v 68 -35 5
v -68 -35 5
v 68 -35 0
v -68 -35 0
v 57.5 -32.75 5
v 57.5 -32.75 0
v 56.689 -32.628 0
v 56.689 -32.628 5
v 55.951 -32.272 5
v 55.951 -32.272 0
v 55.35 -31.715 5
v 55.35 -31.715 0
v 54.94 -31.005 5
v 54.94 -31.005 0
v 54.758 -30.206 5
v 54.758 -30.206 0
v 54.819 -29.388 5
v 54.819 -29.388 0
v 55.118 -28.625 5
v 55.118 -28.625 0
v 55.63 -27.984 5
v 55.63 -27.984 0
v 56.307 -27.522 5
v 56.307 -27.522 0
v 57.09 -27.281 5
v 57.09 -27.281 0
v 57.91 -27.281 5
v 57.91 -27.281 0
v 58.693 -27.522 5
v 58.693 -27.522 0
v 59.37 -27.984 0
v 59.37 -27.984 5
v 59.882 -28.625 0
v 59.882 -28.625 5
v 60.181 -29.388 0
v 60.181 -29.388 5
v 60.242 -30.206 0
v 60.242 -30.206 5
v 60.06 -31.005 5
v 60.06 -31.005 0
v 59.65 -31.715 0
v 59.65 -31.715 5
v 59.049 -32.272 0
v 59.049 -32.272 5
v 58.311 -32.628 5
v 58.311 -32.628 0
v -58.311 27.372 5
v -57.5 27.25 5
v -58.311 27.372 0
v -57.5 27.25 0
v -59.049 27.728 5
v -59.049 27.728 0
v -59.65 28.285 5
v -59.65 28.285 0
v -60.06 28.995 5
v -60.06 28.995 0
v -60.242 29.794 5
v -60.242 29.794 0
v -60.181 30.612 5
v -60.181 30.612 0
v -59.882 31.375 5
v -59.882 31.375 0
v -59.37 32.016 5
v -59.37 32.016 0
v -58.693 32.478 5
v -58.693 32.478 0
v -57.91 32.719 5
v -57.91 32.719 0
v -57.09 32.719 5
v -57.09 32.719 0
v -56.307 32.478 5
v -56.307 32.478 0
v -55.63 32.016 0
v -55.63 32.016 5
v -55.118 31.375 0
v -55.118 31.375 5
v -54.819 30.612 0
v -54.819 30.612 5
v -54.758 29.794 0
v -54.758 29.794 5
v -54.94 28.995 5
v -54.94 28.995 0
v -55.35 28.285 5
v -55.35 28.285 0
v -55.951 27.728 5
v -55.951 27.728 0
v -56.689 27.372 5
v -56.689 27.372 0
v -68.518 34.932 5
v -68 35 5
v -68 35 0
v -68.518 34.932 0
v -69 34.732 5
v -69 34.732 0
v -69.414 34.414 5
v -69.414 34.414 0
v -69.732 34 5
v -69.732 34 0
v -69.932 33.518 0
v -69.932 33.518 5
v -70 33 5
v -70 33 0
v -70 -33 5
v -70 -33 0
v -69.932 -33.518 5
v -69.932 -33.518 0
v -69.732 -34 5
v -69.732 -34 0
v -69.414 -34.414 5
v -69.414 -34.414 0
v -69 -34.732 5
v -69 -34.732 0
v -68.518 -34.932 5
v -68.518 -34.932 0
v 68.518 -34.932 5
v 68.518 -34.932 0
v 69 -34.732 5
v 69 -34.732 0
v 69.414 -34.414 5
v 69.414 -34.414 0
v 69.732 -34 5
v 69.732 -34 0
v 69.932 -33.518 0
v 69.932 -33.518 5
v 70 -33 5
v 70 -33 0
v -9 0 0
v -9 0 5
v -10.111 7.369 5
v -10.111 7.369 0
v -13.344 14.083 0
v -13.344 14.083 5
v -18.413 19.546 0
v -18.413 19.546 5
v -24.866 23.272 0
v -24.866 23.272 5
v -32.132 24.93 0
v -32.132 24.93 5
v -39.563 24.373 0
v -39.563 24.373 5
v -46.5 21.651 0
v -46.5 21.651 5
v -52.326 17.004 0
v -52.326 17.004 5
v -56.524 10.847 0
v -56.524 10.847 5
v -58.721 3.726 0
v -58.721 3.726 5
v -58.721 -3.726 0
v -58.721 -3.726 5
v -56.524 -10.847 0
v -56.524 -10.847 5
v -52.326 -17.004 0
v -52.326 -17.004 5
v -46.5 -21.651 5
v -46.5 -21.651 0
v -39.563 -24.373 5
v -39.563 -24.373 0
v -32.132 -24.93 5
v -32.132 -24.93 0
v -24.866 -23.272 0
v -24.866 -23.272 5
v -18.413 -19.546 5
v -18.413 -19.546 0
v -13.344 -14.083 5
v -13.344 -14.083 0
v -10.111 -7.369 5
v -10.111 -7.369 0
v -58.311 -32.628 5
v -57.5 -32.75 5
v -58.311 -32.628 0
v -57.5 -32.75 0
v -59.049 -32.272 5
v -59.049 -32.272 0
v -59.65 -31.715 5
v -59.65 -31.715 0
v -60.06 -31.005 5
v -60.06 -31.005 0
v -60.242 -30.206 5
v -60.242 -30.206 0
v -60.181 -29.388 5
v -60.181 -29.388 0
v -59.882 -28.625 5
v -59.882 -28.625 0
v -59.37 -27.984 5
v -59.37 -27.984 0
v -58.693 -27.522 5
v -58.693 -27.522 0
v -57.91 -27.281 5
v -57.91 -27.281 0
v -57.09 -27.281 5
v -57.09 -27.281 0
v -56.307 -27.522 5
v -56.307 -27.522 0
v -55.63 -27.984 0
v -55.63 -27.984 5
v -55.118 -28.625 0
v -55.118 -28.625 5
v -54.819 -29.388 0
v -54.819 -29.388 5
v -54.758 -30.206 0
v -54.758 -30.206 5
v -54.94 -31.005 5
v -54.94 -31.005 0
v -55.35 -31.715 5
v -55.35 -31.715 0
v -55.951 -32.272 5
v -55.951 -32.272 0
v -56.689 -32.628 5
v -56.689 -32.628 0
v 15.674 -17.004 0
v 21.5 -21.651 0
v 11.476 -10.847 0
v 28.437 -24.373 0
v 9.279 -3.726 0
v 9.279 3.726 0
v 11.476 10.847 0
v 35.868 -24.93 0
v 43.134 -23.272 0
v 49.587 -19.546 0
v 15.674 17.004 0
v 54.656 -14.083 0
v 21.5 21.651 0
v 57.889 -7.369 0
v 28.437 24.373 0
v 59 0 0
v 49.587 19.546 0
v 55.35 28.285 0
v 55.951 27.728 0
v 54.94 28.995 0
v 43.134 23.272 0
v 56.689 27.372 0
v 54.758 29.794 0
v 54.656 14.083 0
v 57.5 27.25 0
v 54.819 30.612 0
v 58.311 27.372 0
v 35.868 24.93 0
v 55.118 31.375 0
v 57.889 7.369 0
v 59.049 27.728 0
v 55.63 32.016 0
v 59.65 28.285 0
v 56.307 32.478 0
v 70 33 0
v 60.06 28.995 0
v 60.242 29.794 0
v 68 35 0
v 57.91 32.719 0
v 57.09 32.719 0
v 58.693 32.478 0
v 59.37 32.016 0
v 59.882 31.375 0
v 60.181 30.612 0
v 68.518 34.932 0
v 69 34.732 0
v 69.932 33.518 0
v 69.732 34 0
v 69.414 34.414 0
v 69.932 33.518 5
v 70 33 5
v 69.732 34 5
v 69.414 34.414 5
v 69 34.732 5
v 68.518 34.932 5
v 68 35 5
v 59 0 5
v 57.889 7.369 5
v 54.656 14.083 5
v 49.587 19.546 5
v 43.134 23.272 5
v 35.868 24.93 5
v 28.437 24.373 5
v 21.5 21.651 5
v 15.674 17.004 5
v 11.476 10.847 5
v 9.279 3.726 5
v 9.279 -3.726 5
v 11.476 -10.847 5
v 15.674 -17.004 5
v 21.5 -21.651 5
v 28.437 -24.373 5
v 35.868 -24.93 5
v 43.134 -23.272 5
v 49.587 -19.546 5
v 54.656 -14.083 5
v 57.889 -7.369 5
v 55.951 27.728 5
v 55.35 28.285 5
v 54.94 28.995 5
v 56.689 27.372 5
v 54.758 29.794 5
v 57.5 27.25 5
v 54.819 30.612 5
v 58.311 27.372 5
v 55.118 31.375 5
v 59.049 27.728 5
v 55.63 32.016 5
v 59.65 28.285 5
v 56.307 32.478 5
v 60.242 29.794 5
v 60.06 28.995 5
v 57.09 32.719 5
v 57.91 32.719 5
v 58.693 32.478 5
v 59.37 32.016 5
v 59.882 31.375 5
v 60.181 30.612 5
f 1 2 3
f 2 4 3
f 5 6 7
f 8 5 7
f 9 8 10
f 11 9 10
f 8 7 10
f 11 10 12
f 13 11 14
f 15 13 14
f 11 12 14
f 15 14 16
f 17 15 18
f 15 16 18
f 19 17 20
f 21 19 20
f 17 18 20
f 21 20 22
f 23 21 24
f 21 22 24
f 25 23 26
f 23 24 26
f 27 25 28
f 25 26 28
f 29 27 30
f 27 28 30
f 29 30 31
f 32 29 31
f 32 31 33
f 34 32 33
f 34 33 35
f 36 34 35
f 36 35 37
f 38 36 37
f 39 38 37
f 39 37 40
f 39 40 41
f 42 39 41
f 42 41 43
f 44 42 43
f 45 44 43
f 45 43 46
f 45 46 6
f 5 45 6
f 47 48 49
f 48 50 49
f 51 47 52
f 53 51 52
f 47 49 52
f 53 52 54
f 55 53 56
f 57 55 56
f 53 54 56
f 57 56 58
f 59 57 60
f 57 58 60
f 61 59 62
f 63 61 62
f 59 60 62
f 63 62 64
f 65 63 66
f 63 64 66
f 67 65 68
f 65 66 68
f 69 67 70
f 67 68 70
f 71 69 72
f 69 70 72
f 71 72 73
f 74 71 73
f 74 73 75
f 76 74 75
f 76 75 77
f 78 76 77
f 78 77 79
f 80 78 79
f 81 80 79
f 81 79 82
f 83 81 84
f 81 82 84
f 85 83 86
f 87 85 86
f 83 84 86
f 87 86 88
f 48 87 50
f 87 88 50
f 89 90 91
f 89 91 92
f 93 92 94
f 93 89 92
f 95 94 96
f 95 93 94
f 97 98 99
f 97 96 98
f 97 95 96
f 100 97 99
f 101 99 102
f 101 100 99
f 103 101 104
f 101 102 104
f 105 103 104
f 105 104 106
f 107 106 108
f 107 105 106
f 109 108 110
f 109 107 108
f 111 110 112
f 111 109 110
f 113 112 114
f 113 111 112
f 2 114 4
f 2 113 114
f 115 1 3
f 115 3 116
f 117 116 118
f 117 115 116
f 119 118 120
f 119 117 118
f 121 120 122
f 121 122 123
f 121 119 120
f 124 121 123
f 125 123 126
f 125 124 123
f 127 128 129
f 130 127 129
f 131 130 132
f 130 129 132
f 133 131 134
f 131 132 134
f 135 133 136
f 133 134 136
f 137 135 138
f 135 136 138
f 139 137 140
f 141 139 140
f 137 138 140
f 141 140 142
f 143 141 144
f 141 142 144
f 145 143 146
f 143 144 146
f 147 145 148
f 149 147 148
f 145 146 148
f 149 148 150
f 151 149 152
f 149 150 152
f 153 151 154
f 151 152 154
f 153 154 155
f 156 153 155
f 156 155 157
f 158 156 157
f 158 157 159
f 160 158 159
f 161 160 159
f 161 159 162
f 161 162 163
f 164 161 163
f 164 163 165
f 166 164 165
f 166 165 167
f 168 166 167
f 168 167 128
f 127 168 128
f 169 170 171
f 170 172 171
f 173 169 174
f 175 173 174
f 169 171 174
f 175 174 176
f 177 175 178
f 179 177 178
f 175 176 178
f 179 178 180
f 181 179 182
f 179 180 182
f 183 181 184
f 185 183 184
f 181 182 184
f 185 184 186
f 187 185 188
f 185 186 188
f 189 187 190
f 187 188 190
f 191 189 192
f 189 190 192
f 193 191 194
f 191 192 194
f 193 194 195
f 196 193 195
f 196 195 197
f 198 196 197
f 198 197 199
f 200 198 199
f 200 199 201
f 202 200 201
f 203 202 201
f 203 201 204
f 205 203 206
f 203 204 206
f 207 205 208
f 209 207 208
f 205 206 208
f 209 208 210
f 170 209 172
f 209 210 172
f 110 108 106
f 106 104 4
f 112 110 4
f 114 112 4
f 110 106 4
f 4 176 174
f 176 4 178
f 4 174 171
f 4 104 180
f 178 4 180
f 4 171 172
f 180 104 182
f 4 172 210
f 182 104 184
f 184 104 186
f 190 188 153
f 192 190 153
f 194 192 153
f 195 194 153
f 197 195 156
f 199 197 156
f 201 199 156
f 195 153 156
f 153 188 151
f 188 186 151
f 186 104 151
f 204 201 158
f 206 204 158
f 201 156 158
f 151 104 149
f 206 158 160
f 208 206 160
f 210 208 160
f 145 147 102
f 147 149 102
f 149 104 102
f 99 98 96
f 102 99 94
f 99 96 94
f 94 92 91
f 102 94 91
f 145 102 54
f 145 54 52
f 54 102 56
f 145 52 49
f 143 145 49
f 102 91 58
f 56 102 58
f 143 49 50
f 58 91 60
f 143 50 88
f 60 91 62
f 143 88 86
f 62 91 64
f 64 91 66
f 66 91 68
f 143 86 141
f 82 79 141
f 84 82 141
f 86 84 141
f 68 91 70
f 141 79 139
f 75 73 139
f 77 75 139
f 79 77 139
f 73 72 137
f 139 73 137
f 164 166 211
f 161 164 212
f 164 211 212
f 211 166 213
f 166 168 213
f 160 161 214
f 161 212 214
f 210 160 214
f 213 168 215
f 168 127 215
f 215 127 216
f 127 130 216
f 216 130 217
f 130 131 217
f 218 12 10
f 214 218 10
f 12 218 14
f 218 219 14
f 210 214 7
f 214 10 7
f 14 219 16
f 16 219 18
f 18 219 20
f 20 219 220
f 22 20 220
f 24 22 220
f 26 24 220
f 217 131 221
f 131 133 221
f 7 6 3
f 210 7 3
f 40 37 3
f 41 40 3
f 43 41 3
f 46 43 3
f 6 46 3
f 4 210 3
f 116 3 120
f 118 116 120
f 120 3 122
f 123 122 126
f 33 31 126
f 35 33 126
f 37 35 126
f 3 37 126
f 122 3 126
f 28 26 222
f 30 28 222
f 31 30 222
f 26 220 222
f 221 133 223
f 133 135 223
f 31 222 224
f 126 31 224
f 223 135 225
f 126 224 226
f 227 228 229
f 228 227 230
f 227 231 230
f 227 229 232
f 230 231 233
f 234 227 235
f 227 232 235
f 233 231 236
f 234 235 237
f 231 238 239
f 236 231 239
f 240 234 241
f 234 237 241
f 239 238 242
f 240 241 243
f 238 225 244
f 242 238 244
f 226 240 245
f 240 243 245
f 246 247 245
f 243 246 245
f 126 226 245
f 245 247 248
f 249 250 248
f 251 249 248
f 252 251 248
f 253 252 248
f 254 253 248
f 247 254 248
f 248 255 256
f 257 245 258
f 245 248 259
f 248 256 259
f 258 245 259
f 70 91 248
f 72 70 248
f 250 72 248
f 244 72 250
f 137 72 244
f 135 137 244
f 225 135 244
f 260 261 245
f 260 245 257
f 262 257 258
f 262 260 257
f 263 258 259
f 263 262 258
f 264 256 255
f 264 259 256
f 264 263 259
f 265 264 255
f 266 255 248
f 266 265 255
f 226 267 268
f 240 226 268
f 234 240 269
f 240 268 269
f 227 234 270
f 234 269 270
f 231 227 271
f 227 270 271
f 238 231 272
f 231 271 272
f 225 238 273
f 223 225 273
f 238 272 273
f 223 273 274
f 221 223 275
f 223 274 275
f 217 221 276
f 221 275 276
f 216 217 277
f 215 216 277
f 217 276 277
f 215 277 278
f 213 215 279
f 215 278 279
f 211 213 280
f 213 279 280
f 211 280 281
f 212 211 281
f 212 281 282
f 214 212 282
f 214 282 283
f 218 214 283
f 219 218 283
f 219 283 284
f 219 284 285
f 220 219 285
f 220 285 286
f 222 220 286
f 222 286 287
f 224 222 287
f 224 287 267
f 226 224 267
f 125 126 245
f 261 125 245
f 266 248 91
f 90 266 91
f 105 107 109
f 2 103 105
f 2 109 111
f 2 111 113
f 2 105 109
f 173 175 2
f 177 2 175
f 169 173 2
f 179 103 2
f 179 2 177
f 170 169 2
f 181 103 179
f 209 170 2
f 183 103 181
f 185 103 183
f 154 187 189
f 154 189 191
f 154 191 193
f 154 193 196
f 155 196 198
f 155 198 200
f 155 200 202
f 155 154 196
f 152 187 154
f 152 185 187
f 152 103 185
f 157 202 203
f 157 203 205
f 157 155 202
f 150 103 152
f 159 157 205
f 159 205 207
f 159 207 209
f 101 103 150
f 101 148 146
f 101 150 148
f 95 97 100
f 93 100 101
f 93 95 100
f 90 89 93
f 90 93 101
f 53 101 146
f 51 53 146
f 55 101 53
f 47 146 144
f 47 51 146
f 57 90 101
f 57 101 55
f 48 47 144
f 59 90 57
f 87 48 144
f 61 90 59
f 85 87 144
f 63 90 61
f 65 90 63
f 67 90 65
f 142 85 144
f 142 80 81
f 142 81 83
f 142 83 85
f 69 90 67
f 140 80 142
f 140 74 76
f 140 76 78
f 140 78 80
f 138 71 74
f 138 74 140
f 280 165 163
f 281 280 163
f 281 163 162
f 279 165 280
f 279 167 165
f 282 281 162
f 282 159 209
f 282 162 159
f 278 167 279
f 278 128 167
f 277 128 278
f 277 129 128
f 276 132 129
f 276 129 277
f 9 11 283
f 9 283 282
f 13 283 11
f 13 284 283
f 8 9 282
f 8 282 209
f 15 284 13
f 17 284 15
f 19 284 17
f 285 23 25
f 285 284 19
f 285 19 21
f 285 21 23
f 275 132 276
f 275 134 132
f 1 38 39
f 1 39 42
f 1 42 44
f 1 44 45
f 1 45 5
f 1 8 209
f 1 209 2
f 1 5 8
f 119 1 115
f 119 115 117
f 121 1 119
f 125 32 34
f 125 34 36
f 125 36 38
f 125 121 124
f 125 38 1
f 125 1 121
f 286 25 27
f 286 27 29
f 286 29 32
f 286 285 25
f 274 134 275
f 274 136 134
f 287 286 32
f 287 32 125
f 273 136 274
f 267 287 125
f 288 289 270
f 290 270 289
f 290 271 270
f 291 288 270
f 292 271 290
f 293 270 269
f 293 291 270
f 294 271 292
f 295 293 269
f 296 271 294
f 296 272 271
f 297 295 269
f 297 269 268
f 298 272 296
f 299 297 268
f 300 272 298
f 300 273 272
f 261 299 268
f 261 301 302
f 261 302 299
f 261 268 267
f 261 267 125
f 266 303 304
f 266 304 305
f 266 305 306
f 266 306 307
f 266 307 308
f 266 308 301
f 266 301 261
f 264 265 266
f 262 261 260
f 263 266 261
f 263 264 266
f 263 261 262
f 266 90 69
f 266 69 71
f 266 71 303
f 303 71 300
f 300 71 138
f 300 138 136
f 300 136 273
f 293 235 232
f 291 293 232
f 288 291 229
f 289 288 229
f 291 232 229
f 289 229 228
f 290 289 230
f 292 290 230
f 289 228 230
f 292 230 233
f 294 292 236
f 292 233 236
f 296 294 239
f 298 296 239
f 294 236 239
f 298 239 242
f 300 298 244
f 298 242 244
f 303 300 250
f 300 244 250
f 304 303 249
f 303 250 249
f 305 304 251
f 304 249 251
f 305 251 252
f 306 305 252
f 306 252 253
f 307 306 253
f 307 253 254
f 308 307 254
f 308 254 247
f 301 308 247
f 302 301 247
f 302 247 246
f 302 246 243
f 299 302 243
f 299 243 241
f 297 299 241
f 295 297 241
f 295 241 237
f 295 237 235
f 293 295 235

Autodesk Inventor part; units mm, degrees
ref_plane "YZ Plane" through (0, 0, 0) normal (1, 0, 0) x (0, 1, 0)
ref_plane "XZ Plane" through (0, 0, 0) normal (0, 1, 0) x (-1, 0, 0)
ref_plane "XY Plane" through (0, 0, 0) normal (0, 0, 1) x (1, 0, 0)
sketch "Sketch1" plane through (0, 0, 0) normal (0, 0, 1) x (1, 0, 0)
  line L0 (-70, -35) -> (70, -35)
  line L1 (70, -35) -> (70, 35)
  line L2 (70, 35) -> (-70, 35)
  line L3 (-70, 35) -> (-70, -35)
  line L4 (-70, -35) -> (70, 35) construction
  line L5 (70, -35) -> (-70, 35) construction
  point P0 (0, 0)
  dimension "d0" = 140
  dimension "d1" = 70
extrude "Extrusion1" add sketch "Sketch1" along normal blind 5
sketch "Sketch2" plane through (0, 0, 5) normal (0, 0, 1) x (1, 0, 0)
  line L0 (-57.5, -30) -> (57.5, -30) construction
  line L1 (57.5, -30) -> (57.5, 30) construction
  line L2 (57.5, 30) -> (-57.5, 30) construction
  line L3 (-57.5, 30) -> (-57.5, -30) construction
  line L4 (-57.5, -30) -> (57.5, 30) construction
  line L5 (57.5, -30) -> (-57.5, 30) construction
  point P0 (0, 0)
  dimension "d4" = 115
  dimension "d5" = 60
hole "Hole1" at (-57.5, -30, 5) at (-57.5, 30, 5) at (57.5, 30, 5) at (57.5, -30, 5) direction (0, 0, -1) diameter 5.5 depth 8 tip angle 118 clearance for "Countersunk Flat Head Screw DIN EN ISO 2009" size "M5" standard "DIN"
fillet "Fillet1" radius 2 4 edges at (70, 35, 2.5) (70, -35, 2.5) (-70, 35, 2.5) (-70, -35, 2.5)
sketch "Sketch3" plane through (0, 0, 5) normal (0, 0, 1) x (1, 0, 0)
  circle A0 centre (-34, 0) radius 25
  circle A1 centre (34, 0) radius 25
  line L0 (-34, 0) -> (34, 0) construction
  point P0 (0, 0)
  point P1 (0, 0)
  dimension "d14" = 50
  dimension "d15" = 50
  dimension "d16" = 68
extrude "Extrusion2" cut sketch "Sketch3" against normal blind 5
properties part number "EndStück_Caps" material "Polycarbonate, Clear"
